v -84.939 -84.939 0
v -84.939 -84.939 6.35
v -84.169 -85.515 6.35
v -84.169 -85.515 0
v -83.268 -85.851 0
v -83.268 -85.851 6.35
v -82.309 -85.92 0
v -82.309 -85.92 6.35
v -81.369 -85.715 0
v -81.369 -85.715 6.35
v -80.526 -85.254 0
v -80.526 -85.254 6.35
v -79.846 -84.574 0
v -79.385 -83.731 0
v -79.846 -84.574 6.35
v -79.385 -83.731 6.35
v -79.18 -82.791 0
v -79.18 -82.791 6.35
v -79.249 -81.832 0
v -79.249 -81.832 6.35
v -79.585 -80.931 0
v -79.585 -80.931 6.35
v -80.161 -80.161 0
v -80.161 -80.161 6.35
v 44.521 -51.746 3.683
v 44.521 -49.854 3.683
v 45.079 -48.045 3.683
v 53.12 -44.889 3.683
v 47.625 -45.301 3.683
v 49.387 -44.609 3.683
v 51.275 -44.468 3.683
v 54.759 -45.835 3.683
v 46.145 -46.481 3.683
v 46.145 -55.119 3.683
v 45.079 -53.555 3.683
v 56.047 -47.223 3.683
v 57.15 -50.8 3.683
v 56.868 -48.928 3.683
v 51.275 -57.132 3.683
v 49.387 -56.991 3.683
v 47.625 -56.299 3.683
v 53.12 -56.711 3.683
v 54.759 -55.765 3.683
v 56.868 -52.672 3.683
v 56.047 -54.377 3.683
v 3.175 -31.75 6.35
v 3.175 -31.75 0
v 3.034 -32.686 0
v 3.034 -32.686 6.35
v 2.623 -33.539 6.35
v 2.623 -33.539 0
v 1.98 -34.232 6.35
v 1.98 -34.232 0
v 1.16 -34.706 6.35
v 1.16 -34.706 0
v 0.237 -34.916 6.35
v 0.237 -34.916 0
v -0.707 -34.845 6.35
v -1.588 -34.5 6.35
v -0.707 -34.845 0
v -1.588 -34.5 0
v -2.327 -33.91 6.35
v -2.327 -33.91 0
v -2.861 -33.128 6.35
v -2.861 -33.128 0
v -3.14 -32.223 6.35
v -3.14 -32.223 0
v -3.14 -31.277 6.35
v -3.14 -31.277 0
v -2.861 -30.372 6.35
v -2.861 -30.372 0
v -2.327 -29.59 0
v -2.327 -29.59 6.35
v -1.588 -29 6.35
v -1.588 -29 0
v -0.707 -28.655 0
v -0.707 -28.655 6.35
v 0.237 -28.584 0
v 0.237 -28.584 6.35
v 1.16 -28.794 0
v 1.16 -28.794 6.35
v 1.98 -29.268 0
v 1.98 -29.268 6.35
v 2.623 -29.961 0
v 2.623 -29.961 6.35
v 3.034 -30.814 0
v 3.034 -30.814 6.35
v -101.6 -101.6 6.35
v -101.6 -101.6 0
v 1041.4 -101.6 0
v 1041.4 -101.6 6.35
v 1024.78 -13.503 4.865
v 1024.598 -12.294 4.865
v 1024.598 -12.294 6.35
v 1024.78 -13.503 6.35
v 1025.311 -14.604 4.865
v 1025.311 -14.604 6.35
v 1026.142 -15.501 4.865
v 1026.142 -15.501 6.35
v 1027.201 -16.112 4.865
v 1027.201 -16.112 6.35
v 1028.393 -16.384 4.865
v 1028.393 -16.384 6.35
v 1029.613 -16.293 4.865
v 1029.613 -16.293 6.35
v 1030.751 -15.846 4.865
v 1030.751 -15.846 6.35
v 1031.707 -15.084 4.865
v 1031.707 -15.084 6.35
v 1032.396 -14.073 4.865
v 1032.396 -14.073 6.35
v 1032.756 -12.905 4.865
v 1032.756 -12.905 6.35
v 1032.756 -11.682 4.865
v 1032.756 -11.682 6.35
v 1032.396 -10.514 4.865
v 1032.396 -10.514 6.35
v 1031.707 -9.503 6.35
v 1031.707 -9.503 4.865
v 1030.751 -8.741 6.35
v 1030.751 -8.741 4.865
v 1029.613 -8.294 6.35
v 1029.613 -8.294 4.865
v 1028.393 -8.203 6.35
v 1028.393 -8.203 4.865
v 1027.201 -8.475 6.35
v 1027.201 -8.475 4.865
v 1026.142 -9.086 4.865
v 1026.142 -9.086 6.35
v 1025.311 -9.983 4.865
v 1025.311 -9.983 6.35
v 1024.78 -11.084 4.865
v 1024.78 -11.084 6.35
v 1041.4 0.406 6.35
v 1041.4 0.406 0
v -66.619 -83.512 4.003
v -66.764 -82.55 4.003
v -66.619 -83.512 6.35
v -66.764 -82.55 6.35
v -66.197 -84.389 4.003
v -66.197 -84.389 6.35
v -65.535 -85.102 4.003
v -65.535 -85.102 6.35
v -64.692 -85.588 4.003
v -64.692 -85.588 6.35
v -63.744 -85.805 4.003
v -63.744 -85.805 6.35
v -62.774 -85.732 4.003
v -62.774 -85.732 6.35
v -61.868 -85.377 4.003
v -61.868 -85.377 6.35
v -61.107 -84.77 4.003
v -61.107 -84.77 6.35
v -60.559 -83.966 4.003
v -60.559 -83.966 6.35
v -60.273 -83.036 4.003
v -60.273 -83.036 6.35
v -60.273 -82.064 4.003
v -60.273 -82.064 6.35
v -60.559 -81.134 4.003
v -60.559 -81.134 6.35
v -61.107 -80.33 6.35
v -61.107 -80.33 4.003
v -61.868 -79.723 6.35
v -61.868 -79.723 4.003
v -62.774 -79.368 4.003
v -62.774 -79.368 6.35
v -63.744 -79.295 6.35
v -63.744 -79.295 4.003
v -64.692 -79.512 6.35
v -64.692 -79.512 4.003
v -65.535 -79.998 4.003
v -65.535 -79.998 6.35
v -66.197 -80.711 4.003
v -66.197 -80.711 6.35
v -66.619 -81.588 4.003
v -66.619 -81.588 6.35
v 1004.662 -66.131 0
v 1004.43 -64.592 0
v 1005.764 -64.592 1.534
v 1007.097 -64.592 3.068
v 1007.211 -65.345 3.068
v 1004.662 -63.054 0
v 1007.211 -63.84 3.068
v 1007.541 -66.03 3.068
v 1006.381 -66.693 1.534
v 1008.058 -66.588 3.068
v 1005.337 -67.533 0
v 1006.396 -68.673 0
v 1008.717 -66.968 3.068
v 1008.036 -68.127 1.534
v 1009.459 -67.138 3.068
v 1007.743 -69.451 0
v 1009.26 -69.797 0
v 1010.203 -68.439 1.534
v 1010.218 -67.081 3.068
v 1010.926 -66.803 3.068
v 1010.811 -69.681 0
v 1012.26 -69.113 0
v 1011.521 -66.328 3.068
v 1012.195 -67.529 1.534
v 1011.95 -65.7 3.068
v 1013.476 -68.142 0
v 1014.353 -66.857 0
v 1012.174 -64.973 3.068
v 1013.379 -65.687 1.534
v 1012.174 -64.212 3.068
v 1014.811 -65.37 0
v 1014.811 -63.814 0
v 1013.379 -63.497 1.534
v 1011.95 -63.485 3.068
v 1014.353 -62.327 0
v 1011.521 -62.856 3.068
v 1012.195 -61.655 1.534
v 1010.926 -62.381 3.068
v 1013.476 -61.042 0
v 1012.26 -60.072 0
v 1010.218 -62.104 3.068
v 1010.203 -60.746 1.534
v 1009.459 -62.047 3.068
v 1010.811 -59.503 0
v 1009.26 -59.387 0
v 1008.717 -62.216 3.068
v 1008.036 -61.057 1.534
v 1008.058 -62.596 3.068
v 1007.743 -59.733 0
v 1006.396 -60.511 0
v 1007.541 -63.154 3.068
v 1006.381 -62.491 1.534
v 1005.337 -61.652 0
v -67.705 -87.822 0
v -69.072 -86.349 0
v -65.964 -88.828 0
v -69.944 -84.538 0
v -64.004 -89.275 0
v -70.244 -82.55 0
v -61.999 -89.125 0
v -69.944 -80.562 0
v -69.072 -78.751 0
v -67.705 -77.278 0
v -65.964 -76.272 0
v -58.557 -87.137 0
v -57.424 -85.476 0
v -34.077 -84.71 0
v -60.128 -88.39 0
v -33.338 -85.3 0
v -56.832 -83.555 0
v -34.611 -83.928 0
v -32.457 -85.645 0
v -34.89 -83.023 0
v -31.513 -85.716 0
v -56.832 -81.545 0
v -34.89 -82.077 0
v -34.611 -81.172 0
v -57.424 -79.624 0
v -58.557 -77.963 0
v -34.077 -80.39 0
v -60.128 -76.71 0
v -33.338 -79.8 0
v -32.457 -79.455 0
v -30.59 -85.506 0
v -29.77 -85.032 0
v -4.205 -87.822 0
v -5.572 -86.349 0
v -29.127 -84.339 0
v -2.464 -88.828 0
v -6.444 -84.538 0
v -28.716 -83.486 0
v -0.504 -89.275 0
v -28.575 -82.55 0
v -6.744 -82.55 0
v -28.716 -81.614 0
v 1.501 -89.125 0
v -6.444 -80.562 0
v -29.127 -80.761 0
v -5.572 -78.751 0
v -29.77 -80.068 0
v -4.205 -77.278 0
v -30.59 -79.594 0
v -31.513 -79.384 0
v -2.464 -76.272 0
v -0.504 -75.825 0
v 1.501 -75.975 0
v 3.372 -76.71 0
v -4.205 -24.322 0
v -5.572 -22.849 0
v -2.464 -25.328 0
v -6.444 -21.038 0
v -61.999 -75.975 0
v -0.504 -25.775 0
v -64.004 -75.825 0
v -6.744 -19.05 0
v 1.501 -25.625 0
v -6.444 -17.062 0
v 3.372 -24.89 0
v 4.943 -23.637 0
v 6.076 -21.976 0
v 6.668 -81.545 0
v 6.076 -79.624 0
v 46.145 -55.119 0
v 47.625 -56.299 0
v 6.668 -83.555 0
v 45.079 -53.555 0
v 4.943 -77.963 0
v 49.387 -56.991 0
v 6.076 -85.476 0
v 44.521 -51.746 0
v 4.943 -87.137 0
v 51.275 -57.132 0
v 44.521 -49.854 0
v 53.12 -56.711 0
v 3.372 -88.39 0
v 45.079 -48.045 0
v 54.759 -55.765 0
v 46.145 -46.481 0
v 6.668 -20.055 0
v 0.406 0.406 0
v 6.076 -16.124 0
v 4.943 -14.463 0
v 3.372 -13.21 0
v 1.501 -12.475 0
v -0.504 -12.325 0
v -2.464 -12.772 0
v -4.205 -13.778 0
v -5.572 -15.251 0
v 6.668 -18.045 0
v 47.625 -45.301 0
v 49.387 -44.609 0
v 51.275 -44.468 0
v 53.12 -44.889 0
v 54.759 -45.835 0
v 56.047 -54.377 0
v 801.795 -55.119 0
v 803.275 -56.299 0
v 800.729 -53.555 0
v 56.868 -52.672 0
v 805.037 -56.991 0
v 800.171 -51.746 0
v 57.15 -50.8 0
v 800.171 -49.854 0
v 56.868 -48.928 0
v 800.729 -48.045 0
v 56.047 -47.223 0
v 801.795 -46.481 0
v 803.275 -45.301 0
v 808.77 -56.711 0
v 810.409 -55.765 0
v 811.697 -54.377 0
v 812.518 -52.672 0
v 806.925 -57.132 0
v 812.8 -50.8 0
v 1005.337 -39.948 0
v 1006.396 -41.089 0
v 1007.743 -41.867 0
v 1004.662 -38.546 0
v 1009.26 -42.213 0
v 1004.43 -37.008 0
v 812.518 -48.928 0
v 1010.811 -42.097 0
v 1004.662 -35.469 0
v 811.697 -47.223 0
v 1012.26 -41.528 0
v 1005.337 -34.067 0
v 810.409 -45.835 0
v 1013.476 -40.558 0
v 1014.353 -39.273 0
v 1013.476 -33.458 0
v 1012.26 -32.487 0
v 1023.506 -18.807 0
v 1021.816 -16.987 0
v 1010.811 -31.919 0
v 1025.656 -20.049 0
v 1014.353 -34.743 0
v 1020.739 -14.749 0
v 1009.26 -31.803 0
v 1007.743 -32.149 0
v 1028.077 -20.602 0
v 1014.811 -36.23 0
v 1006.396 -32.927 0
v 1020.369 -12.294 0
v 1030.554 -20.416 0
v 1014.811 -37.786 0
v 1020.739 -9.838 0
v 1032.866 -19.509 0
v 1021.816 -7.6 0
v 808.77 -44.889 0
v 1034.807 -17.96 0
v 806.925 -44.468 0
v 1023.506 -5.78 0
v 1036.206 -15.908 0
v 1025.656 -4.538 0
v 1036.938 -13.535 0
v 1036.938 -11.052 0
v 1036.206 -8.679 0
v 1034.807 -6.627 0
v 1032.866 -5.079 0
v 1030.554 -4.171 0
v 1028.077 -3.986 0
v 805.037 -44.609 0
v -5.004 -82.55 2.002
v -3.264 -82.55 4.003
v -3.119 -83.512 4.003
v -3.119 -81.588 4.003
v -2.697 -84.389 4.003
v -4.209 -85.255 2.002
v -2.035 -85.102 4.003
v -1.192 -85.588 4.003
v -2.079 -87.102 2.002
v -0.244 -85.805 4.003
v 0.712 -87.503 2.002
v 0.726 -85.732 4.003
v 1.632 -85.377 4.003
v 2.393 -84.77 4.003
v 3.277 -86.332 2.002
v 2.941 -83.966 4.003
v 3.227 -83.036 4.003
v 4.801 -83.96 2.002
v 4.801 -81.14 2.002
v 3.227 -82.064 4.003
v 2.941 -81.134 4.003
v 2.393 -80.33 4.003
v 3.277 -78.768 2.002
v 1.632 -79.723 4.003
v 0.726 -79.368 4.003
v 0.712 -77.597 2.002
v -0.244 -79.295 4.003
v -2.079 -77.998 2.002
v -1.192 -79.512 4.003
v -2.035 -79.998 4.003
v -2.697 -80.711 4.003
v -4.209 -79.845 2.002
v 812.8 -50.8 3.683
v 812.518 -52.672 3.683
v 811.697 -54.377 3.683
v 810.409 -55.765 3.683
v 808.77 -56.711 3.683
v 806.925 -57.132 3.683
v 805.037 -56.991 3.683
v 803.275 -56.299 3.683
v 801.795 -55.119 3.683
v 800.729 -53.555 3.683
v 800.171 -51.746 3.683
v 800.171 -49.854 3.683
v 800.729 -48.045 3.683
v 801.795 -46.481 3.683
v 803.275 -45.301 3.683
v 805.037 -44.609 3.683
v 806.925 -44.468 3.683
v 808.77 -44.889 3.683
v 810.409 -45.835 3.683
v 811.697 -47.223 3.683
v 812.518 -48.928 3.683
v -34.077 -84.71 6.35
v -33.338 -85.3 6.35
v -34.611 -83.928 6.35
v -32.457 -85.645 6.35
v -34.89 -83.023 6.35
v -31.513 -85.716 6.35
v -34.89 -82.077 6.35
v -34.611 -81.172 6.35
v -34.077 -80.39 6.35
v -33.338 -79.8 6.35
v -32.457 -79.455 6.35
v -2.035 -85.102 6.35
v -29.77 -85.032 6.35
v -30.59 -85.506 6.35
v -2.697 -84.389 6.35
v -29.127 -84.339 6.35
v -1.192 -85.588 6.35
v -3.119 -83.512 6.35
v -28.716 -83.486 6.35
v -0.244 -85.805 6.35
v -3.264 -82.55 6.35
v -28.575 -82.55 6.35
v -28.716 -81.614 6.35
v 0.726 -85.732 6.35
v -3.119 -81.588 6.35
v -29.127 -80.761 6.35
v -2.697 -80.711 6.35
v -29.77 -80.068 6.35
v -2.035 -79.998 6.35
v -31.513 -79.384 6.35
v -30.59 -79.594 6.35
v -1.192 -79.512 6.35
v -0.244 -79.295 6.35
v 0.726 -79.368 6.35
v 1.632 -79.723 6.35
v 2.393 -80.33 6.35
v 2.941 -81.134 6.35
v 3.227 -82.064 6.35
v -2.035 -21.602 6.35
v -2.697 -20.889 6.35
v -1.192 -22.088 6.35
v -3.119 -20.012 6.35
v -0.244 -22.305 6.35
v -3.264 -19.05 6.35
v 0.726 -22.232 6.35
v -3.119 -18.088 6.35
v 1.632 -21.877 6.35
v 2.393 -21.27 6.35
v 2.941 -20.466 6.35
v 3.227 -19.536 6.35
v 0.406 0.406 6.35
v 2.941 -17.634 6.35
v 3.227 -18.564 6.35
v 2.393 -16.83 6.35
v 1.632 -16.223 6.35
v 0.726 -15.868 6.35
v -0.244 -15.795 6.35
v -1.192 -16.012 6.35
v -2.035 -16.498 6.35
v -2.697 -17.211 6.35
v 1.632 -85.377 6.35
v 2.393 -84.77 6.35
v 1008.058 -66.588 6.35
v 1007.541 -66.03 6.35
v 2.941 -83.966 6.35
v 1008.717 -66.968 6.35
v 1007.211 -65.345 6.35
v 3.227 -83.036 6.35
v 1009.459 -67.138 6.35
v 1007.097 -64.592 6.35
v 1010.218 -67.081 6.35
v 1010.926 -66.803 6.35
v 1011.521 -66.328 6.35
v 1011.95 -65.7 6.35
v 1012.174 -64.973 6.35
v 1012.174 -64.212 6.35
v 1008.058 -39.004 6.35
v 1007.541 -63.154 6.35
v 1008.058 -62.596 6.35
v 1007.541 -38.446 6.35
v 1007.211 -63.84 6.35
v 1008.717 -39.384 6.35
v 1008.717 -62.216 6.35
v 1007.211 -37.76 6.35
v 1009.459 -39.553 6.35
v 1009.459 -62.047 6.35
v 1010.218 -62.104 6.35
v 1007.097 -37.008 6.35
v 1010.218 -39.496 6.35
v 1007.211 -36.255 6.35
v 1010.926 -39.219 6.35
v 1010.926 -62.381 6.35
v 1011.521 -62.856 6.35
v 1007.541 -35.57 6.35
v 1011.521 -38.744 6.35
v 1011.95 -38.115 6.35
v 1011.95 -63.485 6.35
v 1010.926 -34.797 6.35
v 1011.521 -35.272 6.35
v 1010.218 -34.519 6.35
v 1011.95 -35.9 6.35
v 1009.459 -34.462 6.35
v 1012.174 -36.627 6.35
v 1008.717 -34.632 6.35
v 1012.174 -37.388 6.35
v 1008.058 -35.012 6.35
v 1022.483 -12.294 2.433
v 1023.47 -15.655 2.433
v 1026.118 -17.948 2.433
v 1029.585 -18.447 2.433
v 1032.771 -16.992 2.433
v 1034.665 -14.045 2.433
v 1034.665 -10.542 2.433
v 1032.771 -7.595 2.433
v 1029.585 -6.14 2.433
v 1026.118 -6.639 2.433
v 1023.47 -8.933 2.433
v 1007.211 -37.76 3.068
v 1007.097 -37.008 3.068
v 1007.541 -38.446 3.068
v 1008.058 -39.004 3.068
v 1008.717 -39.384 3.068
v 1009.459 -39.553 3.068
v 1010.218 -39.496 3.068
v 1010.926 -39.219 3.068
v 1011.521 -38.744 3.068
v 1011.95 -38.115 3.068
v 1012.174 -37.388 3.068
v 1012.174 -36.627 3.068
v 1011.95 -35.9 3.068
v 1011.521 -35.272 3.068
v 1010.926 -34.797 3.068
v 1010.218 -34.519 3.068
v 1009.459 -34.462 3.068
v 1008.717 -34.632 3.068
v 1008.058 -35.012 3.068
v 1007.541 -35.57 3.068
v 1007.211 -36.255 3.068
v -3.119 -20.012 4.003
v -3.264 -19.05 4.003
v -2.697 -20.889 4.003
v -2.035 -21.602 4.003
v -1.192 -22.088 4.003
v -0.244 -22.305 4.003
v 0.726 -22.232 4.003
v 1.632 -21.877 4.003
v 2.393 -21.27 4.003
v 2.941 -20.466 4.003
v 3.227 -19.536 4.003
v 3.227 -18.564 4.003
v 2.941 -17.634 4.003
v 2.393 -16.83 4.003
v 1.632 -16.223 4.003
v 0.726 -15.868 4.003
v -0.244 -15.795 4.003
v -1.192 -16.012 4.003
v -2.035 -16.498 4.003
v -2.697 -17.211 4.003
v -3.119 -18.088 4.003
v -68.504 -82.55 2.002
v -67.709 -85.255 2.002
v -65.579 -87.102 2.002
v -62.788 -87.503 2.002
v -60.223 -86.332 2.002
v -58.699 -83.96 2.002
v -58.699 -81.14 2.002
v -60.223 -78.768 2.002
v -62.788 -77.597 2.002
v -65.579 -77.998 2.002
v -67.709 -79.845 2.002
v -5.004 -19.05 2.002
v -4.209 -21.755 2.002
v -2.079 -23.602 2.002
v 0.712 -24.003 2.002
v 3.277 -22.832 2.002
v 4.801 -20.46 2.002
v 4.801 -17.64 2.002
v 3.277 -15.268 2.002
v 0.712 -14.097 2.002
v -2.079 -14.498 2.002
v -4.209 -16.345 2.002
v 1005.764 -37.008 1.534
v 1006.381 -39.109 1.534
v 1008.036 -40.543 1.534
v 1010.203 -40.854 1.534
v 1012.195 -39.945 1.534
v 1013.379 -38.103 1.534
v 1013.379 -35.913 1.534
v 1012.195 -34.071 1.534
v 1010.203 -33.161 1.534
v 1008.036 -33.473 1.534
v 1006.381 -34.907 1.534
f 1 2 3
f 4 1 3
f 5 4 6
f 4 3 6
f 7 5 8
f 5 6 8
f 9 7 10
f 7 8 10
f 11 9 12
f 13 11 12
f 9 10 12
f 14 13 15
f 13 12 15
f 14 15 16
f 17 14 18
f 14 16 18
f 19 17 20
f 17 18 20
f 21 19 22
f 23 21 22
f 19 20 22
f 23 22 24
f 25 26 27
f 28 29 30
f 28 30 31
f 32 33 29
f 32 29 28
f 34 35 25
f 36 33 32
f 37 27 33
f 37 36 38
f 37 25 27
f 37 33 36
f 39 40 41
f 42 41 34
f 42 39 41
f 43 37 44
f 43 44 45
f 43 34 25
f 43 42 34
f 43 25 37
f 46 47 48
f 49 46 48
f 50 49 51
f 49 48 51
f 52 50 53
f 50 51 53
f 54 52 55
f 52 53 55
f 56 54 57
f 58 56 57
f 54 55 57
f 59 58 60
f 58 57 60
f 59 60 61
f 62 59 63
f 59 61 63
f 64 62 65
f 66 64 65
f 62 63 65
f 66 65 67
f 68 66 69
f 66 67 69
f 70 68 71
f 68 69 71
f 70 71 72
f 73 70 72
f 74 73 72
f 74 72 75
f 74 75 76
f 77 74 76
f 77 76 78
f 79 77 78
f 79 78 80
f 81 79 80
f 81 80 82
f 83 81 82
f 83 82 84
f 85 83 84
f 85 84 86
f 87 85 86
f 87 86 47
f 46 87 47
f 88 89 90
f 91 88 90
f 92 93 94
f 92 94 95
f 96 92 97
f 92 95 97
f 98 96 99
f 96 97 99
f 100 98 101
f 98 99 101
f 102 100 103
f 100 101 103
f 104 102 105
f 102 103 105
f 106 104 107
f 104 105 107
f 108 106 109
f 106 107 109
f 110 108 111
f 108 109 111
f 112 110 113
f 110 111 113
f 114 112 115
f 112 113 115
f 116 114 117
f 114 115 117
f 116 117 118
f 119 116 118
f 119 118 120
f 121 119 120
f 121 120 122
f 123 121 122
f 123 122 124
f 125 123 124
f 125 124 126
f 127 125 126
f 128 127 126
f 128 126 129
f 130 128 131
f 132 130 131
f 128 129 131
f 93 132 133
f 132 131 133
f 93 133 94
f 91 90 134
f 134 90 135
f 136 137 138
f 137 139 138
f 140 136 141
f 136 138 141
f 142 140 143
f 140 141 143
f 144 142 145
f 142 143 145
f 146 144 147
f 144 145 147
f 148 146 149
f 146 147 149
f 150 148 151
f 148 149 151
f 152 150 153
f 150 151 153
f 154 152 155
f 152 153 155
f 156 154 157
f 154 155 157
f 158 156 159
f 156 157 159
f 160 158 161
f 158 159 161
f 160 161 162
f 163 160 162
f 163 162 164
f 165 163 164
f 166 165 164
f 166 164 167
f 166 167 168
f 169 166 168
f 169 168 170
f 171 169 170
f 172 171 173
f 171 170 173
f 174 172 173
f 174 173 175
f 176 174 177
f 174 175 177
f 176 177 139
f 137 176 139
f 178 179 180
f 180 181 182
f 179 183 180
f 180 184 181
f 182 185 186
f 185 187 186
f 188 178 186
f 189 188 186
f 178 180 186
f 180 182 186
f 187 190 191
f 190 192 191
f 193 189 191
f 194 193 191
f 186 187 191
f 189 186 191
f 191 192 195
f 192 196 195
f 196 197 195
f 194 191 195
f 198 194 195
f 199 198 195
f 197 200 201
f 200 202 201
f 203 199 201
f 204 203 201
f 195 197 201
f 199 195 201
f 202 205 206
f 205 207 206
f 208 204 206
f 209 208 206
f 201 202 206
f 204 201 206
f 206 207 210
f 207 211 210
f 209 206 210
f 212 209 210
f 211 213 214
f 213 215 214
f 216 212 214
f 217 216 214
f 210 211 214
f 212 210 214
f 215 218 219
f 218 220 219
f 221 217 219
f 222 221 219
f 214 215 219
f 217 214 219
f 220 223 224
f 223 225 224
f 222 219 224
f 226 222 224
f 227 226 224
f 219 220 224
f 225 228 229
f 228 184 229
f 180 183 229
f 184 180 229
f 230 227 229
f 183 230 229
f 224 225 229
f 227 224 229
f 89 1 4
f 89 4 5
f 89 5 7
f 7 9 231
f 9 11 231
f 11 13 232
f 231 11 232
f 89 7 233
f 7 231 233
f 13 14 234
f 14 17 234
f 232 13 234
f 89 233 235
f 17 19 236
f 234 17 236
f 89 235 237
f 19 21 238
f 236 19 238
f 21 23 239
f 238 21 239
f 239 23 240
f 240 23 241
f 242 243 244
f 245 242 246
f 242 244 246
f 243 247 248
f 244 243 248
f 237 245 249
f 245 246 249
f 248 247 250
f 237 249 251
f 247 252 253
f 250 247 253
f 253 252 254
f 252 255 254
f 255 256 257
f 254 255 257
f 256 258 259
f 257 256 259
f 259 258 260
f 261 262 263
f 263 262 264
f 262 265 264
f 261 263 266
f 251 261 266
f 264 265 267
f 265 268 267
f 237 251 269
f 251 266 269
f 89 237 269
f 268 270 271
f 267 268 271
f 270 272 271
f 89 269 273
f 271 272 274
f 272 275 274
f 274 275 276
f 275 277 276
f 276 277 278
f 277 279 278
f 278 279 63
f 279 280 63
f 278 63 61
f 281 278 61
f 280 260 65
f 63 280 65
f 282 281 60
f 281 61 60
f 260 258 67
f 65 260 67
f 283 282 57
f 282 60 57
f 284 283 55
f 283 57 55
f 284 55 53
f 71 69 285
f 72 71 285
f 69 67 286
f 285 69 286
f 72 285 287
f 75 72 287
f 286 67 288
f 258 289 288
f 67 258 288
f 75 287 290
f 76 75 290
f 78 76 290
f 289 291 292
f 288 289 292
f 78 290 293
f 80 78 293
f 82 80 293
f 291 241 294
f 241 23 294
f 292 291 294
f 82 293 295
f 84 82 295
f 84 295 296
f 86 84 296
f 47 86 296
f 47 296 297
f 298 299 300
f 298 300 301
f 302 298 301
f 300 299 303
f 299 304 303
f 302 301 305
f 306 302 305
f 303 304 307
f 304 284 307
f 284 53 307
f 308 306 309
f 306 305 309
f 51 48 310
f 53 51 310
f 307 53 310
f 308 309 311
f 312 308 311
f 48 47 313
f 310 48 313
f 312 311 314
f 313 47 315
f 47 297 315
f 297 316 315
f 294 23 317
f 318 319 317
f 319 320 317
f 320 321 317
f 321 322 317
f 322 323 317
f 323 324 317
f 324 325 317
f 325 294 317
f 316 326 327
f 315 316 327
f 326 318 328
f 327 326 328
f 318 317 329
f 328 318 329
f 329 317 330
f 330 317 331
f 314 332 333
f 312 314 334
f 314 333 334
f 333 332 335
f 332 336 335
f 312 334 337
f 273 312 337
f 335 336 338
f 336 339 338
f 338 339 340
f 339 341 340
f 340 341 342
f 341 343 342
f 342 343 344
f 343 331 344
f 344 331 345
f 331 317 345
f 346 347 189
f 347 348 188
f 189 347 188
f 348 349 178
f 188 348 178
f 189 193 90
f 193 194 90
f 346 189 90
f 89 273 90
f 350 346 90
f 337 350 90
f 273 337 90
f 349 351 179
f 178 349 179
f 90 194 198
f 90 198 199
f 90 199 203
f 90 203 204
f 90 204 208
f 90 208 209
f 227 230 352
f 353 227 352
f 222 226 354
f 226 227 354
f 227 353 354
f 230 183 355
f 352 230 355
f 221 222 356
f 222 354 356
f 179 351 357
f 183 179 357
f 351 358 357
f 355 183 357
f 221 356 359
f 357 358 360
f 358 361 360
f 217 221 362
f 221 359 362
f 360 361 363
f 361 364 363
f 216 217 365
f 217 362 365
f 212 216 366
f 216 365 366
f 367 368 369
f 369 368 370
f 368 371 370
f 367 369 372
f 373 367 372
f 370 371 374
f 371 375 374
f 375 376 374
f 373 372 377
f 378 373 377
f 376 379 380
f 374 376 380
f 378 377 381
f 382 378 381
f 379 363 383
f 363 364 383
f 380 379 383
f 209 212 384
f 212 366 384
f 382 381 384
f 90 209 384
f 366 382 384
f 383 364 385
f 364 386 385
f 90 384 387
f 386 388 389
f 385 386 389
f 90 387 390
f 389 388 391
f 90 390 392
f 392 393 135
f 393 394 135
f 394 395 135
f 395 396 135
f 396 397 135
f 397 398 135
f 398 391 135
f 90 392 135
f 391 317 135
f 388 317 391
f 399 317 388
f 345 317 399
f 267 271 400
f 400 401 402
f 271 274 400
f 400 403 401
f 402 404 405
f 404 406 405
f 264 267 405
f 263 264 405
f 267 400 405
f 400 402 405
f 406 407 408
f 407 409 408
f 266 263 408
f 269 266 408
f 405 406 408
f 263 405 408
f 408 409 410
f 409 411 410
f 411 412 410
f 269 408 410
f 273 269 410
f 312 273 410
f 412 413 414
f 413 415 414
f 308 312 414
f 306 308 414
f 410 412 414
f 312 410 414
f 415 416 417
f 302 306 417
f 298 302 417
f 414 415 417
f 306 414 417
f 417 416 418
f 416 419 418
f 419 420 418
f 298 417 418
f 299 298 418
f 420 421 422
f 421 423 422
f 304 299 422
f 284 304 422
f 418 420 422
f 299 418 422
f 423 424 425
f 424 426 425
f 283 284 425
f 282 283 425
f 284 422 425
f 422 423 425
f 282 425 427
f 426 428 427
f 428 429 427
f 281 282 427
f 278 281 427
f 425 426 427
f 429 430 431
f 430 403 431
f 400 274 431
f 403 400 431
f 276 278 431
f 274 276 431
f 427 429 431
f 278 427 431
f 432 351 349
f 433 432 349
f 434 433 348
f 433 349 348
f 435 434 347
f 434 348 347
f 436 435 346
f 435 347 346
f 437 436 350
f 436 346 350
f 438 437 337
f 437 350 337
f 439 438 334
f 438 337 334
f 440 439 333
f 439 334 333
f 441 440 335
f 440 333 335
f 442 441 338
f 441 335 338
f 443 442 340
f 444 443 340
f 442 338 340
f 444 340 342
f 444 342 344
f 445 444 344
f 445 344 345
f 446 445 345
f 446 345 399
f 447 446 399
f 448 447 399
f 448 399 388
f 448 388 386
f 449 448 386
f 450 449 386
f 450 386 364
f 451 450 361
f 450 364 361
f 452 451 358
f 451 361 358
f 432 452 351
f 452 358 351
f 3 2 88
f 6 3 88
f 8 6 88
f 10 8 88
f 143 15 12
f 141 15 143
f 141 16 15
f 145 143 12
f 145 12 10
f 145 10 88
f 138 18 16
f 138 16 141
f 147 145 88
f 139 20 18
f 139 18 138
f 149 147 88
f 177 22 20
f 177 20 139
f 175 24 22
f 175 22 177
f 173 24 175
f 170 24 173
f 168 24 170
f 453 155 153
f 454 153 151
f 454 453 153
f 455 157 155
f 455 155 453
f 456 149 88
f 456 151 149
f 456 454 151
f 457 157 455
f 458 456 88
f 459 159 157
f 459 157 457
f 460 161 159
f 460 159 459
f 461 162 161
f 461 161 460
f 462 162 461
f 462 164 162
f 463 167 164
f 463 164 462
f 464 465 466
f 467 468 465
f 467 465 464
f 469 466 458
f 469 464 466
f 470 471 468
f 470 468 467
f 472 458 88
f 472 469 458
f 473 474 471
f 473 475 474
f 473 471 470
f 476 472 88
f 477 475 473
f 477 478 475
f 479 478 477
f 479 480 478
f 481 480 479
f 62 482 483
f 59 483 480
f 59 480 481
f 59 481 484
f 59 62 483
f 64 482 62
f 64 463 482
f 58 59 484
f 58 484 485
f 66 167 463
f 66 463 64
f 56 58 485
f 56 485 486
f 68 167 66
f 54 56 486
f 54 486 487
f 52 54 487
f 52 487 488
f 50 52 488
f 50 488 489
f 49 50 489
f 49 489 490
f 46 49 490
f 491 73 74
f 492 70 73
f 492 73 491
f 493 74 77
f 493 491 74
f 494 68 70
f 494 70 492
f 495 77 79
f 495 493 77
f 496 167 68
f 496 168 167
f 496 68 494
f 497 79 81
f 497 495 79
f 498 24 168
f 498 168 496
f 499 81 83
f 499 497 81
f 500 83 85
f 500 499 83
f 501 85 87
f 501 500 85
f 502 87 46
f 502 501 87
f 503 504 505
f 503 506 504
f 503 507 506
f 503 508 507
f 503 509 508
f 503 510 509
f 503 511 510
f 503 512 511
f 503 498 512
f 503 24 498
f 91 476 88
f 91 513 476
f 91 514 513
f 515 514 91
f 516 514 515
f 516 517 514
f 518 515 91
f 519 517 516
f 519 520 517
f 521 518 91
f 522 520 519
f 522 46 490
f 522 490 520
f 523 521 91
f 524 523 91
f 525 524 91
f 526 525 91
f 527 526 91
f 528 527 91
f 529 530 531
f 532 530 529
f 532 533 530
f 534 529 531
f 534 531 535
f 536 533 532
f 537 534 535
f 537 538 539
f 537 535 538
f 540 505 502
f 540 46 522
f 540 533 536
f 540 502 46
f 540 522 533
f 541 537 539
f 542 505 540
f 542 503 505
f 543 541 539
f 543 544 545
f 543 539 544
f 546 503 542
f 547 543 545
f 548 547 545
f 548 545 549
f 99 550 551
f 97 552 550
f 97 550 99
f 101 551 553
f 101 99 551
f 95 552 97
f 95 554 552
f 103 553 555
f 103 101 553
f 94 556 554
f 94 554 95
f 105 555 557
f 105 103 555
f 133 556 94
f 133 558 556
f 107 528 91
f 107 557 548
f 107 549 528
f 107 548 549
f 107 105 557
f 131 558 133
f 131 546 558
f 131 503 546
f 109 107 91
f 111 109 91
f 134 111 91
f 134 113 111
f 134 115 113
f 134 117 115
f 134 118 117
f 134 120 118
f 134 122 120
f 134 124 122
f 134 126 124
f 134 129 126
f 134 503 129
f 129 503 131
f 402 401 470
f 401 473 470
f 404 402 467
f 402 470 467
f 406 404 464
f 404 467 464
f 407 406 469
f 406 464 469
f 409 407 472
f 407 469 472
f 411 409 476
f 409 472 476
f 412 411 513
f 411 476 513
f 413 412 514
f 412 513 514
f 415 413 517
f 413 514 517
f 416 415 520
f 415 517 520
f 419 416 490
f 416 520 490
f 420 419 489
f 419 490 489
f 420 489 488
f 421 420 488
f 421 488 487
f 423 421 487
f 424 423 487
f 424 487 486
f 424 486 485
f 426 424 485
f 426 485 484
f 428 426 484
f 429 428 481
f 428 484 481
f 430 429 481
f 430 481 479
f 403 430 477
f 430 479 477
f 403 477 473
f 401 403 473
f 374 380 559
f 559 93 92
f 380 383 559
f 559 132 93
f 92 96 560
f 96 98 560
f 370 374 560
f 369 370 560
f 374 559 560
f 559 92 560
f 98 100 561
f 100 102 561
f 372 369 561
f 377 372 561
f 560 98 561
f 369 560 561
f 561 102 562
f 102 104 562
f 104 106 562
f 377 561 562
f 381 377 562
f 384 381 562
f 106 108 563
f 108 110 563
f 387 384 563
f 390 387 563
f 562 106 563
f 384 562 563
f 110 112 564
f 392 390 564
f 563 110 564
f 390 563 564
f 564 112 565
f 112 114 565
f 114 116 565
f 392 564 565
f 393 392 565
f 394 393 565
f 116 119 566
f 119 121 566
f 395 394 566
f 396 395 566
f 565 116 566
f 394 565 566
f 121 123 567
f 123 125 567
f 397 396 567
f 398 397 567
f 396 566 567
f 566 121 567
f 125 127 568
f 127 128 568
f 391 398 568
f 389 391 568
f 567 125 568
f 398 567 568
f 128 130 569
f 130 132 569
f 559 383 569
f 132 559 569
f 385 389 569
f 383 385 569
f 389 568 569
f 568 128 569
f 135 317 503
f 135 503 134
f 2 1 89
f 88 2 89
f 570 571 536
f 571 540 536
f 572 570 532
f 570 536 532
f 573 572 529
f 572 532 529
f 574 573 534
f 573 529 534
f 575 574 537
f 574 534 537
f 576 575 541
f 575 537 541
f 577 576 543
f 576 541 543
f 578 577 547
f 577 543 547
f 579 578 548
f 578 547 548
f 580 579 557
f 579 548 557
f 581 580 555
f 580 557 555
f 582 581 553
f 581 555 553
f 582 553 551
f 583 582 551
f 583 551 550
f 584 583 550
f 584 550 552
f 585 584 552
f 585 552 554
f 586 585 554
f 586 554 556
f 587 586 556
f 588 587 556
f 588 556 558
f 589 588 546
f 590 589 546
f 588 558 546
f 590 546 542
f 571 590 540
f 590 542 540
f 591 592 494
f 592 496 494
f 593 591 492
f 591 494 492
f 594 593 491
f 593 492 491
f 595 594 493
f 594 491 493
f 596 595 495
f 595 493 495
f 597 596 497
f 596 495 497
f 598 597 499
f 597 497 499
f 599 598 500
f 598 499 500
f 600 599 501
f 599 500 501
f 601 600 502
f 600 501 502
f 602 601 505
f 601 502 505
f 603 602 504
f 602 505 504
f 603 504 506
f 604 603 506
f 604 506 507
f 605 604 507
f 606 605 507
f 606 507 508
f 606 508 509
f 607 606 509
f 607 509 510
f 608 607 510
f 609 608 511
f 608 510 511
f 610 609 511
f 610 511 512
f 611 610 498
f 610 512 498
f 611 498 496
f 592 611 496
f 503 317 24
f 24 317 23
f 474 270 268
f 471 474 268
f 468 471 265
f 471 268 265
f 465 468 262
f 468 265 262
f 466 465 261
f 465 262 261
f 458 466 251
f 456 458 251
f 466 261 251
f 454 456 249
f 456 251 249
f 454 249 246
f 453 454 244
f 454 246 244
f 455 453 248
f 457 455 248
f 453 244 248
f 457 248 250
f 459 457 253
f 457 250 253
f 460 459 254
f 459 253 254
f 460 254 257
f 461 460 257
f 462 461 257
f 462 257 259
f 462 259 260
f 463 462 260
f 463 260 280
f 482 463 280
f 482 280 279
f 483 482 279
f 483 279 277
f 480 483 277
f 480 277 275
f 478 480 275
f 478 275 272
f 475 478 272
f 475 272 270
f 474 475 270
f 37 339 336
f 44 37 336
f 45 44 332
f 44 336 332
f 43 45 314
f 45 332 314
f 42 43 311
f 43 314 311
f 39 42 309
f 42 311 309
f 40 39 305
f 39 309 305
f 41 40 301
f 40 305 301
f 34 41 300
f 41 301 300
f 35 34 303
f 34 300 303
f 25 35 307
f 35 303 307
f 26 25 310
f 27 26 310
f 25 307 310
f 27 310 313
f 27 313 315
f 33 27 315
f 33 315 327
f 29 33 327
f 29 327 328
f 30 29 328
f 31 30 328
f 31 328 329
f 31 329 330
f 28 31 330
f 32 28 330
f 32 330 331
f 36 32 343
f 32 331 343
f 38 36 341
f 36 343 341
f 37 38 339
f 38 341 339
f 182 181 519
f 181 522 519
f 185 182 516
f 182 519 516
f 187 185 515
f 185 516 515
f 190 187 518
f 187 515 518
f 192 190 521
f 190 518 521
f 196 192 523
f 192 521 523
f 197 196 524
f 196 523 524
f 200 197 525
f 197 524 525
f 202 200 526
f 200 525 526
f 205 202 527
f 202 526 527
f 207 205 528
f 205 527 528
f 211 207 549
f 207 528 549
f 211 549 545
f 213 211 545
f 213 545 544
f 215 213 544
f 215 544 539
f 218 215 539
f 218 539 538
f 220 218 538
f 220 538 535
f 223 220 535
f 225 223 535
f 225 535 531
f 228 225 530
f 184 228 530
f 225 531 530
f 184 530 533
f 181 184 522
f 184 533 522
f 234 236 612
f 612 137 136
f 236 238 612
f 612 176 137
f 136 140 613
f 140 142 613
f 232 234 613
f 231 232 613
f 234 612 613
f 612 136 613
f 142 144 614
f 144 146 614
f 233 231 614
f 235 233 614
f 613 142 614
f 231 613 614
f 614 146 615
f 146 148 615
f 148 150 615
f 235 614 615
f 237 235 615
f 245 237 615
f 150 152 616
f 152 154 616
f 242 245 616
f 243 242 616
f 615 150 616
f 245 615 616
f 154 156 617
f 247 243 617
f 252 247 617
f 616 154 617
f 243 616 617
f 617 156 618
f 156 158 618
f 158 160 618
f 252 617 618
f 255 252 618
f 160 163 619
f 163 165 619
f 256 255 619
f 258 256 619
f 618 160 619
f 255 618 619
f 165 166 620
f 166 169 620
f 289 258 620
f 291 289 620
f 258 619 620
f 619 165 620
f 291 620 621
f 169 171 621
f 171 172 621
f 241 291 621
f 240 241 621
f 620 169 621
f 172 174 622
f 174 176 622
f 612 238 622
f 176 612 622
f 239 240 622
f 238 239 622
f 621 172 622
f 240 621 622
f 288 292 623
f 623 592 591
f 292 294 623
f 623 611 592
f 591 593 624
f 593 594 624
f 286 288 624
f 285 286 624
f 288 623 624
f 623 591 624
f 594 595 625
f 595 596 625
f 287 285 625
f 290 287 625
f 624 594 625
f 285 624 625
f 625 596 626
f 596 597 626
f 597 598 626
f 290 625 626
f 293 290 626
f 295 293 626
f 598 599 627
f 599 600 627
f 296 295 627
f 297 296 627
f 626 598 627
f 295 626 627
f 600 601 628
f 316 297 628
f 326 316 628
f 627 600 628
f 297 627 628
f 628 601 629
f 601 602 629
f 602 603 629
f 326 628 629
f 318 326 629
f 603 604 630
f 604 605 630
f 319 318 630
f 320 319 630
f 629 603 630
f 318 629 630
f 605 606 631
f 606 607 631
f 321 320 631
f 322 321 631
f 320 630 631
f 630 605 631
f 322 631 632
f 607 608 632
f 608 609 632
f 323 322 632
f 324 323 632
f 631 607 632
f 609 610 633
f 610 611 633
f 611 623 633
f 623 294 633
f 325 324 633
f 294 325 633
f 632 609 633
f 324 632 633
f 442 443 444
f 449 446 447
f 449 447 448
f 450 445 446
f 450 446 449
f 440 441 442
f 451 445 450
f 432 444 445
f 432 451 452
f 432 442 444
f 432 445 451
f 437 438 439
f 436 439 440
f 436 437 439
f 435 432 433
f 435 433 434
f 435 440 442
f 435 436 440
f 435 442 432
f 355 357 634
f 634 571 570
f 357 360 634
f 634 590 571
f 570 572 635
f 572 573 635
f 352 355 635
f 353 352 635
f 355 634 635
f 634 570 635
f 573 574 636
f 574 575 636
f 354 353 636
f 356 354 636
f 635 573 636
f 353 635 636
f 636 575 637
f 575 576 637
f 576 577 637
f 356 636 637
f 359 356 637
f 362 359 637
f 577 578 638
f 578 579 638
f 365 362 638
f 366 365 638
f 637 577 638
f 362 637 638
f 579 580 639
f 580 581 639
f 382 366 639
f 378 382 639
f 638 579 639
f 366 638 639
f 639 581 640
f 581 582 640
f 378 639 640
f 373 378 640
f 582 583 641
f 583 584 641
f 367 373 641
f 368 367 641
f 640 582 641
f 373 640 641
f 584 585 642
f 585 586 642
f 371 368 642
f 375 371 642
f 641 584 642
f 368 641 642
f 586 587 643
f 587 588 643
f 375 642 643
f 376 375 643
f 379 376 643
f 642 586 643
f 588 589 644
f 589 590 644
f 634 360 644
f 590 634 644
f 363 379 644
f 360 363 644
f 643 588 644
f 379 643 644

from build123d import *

# Parameters (mm, degrees)
F1_DEPTH        = 6.35
F3_D            = 6.5278
F3_CSINK_D      = 13.4874
F3_CSINK_ANGLE  = 82
F4_R            = 6.35
F5_DEPTH        = 3.683
F7_D            = 5.1054
F7_CSINK_D      = 10.4394
F7_CSINK_ANGLE  = 82
F9_D            = 6.7564
F10_R           = 3.175
F11_DEPTH       = 6.351
F12_W           = 1041.4
F12_H           = 0.4064
F13_DEPTH       = 6.35
F15_DEPTH       = 25.4
F17_D           = 8.2042
F17_CSINK_D     = 16.6624
F17_CSINK_ANGLE = 82


with BuildPart() as f1:
    # F0 (on Top) → F1 (new body)
    with BuildSketch(Plane.XY):
        Polygon((1041.4, 0), (0, 0), (-101.6, -101.6), (1041.4, -101.6), align=None)
    extrude(amount=F1_DEPTH)

    # F3 (through all)
    with Locations(Plane(origin=(0, 0, 0), x_dir=(1, 0, 0), z_dir=(0, 0, -1))):
        with Locations((-63.5, 82.55), (0, 82.55), (0, 19.05)):
            CounterSinkHole(F3_D / 2, F3_CSINK_D / 2, counter_sink_angle=F3_CSINK_ANGLE)

    # F4 (on face) → F5 (cut)
    with BuildSketch(Plane(origin=(0, 0, 0), x_dir=(1, 0, 0), z_dir=(0, 0, -1))):
        with Locations((50.8, 50.8)):
            Circle(F4_R)
        with Locations((806.45, 50.8)):
            Circle(F4_R)
    extrude(amount=-F5_DEPTH, mode=Mode.SUBTRACT)

    # F7 (through all)
    with Locations(Plane(origin=(0, 0, 0), x_dir=(1, 0, 0), z_dir=(0, 0, -1))):
        with Locations((1009.65, 64.5922), (1009.65, 37.0078)):
            CounterSinkHole(F7_D / 2, F7_CSINK_D / 2, counter_sink_angle=F7_CSINK_ANGLE)

    # F9 (through all)
    with Locations(Plane(origin=(0, 0, 0), x_dir=(1, 0, 0), z_dir=(0, 0, -1))):
        with Locations((-82.55, 82.55)):
            Hole(F9_D / 2)

    # F10 (on face) → F11 (cut, through all)
    with BuildSketch(Plane(origin=(0, 0, 0), x_dir=(1, 0, 0), z_dir=(0, 0, -1))):
        with Locations((-31.75, 82.55)):
            Circle(F10_R)
        with Locations((0, 31.75)):
            Circle(F10_R)
    extrude(amount=-F11_DEPTH, mode=Mode.SUBTRACT)

    # F12 (on Top) → F13 (join)
    with BuildSketch(Plane.XY):
        with Locations((520.7, 0.2032)):
            Rectangle(F12_W, F12_H)
    extrude(amount=F13_DEPTH)

    # F14 (on face) → F15 (cut)
    with BuildSketch(Plane.XY.offset(6.35)):
        Polygon((0, 0.4064), (0, 0), (0.4064, 0.4064), align=None)
    extrude(amount=-F15_DEPTH, mode=Mode.SUBTRACT)

    # F17 (through all)
    with Locations(Plane(origin=(0, 0, 0), x_dir=(1, 0, 0), z_dir=(0, 0, -1))):
        with Locations((1028.7, 12.2936)):
            CounterSinkHole(F17_D / 2, F17_CSINK_D / 2, counter_sink_angle=F17_CSINK_ANGLE)


solid = f1.part
